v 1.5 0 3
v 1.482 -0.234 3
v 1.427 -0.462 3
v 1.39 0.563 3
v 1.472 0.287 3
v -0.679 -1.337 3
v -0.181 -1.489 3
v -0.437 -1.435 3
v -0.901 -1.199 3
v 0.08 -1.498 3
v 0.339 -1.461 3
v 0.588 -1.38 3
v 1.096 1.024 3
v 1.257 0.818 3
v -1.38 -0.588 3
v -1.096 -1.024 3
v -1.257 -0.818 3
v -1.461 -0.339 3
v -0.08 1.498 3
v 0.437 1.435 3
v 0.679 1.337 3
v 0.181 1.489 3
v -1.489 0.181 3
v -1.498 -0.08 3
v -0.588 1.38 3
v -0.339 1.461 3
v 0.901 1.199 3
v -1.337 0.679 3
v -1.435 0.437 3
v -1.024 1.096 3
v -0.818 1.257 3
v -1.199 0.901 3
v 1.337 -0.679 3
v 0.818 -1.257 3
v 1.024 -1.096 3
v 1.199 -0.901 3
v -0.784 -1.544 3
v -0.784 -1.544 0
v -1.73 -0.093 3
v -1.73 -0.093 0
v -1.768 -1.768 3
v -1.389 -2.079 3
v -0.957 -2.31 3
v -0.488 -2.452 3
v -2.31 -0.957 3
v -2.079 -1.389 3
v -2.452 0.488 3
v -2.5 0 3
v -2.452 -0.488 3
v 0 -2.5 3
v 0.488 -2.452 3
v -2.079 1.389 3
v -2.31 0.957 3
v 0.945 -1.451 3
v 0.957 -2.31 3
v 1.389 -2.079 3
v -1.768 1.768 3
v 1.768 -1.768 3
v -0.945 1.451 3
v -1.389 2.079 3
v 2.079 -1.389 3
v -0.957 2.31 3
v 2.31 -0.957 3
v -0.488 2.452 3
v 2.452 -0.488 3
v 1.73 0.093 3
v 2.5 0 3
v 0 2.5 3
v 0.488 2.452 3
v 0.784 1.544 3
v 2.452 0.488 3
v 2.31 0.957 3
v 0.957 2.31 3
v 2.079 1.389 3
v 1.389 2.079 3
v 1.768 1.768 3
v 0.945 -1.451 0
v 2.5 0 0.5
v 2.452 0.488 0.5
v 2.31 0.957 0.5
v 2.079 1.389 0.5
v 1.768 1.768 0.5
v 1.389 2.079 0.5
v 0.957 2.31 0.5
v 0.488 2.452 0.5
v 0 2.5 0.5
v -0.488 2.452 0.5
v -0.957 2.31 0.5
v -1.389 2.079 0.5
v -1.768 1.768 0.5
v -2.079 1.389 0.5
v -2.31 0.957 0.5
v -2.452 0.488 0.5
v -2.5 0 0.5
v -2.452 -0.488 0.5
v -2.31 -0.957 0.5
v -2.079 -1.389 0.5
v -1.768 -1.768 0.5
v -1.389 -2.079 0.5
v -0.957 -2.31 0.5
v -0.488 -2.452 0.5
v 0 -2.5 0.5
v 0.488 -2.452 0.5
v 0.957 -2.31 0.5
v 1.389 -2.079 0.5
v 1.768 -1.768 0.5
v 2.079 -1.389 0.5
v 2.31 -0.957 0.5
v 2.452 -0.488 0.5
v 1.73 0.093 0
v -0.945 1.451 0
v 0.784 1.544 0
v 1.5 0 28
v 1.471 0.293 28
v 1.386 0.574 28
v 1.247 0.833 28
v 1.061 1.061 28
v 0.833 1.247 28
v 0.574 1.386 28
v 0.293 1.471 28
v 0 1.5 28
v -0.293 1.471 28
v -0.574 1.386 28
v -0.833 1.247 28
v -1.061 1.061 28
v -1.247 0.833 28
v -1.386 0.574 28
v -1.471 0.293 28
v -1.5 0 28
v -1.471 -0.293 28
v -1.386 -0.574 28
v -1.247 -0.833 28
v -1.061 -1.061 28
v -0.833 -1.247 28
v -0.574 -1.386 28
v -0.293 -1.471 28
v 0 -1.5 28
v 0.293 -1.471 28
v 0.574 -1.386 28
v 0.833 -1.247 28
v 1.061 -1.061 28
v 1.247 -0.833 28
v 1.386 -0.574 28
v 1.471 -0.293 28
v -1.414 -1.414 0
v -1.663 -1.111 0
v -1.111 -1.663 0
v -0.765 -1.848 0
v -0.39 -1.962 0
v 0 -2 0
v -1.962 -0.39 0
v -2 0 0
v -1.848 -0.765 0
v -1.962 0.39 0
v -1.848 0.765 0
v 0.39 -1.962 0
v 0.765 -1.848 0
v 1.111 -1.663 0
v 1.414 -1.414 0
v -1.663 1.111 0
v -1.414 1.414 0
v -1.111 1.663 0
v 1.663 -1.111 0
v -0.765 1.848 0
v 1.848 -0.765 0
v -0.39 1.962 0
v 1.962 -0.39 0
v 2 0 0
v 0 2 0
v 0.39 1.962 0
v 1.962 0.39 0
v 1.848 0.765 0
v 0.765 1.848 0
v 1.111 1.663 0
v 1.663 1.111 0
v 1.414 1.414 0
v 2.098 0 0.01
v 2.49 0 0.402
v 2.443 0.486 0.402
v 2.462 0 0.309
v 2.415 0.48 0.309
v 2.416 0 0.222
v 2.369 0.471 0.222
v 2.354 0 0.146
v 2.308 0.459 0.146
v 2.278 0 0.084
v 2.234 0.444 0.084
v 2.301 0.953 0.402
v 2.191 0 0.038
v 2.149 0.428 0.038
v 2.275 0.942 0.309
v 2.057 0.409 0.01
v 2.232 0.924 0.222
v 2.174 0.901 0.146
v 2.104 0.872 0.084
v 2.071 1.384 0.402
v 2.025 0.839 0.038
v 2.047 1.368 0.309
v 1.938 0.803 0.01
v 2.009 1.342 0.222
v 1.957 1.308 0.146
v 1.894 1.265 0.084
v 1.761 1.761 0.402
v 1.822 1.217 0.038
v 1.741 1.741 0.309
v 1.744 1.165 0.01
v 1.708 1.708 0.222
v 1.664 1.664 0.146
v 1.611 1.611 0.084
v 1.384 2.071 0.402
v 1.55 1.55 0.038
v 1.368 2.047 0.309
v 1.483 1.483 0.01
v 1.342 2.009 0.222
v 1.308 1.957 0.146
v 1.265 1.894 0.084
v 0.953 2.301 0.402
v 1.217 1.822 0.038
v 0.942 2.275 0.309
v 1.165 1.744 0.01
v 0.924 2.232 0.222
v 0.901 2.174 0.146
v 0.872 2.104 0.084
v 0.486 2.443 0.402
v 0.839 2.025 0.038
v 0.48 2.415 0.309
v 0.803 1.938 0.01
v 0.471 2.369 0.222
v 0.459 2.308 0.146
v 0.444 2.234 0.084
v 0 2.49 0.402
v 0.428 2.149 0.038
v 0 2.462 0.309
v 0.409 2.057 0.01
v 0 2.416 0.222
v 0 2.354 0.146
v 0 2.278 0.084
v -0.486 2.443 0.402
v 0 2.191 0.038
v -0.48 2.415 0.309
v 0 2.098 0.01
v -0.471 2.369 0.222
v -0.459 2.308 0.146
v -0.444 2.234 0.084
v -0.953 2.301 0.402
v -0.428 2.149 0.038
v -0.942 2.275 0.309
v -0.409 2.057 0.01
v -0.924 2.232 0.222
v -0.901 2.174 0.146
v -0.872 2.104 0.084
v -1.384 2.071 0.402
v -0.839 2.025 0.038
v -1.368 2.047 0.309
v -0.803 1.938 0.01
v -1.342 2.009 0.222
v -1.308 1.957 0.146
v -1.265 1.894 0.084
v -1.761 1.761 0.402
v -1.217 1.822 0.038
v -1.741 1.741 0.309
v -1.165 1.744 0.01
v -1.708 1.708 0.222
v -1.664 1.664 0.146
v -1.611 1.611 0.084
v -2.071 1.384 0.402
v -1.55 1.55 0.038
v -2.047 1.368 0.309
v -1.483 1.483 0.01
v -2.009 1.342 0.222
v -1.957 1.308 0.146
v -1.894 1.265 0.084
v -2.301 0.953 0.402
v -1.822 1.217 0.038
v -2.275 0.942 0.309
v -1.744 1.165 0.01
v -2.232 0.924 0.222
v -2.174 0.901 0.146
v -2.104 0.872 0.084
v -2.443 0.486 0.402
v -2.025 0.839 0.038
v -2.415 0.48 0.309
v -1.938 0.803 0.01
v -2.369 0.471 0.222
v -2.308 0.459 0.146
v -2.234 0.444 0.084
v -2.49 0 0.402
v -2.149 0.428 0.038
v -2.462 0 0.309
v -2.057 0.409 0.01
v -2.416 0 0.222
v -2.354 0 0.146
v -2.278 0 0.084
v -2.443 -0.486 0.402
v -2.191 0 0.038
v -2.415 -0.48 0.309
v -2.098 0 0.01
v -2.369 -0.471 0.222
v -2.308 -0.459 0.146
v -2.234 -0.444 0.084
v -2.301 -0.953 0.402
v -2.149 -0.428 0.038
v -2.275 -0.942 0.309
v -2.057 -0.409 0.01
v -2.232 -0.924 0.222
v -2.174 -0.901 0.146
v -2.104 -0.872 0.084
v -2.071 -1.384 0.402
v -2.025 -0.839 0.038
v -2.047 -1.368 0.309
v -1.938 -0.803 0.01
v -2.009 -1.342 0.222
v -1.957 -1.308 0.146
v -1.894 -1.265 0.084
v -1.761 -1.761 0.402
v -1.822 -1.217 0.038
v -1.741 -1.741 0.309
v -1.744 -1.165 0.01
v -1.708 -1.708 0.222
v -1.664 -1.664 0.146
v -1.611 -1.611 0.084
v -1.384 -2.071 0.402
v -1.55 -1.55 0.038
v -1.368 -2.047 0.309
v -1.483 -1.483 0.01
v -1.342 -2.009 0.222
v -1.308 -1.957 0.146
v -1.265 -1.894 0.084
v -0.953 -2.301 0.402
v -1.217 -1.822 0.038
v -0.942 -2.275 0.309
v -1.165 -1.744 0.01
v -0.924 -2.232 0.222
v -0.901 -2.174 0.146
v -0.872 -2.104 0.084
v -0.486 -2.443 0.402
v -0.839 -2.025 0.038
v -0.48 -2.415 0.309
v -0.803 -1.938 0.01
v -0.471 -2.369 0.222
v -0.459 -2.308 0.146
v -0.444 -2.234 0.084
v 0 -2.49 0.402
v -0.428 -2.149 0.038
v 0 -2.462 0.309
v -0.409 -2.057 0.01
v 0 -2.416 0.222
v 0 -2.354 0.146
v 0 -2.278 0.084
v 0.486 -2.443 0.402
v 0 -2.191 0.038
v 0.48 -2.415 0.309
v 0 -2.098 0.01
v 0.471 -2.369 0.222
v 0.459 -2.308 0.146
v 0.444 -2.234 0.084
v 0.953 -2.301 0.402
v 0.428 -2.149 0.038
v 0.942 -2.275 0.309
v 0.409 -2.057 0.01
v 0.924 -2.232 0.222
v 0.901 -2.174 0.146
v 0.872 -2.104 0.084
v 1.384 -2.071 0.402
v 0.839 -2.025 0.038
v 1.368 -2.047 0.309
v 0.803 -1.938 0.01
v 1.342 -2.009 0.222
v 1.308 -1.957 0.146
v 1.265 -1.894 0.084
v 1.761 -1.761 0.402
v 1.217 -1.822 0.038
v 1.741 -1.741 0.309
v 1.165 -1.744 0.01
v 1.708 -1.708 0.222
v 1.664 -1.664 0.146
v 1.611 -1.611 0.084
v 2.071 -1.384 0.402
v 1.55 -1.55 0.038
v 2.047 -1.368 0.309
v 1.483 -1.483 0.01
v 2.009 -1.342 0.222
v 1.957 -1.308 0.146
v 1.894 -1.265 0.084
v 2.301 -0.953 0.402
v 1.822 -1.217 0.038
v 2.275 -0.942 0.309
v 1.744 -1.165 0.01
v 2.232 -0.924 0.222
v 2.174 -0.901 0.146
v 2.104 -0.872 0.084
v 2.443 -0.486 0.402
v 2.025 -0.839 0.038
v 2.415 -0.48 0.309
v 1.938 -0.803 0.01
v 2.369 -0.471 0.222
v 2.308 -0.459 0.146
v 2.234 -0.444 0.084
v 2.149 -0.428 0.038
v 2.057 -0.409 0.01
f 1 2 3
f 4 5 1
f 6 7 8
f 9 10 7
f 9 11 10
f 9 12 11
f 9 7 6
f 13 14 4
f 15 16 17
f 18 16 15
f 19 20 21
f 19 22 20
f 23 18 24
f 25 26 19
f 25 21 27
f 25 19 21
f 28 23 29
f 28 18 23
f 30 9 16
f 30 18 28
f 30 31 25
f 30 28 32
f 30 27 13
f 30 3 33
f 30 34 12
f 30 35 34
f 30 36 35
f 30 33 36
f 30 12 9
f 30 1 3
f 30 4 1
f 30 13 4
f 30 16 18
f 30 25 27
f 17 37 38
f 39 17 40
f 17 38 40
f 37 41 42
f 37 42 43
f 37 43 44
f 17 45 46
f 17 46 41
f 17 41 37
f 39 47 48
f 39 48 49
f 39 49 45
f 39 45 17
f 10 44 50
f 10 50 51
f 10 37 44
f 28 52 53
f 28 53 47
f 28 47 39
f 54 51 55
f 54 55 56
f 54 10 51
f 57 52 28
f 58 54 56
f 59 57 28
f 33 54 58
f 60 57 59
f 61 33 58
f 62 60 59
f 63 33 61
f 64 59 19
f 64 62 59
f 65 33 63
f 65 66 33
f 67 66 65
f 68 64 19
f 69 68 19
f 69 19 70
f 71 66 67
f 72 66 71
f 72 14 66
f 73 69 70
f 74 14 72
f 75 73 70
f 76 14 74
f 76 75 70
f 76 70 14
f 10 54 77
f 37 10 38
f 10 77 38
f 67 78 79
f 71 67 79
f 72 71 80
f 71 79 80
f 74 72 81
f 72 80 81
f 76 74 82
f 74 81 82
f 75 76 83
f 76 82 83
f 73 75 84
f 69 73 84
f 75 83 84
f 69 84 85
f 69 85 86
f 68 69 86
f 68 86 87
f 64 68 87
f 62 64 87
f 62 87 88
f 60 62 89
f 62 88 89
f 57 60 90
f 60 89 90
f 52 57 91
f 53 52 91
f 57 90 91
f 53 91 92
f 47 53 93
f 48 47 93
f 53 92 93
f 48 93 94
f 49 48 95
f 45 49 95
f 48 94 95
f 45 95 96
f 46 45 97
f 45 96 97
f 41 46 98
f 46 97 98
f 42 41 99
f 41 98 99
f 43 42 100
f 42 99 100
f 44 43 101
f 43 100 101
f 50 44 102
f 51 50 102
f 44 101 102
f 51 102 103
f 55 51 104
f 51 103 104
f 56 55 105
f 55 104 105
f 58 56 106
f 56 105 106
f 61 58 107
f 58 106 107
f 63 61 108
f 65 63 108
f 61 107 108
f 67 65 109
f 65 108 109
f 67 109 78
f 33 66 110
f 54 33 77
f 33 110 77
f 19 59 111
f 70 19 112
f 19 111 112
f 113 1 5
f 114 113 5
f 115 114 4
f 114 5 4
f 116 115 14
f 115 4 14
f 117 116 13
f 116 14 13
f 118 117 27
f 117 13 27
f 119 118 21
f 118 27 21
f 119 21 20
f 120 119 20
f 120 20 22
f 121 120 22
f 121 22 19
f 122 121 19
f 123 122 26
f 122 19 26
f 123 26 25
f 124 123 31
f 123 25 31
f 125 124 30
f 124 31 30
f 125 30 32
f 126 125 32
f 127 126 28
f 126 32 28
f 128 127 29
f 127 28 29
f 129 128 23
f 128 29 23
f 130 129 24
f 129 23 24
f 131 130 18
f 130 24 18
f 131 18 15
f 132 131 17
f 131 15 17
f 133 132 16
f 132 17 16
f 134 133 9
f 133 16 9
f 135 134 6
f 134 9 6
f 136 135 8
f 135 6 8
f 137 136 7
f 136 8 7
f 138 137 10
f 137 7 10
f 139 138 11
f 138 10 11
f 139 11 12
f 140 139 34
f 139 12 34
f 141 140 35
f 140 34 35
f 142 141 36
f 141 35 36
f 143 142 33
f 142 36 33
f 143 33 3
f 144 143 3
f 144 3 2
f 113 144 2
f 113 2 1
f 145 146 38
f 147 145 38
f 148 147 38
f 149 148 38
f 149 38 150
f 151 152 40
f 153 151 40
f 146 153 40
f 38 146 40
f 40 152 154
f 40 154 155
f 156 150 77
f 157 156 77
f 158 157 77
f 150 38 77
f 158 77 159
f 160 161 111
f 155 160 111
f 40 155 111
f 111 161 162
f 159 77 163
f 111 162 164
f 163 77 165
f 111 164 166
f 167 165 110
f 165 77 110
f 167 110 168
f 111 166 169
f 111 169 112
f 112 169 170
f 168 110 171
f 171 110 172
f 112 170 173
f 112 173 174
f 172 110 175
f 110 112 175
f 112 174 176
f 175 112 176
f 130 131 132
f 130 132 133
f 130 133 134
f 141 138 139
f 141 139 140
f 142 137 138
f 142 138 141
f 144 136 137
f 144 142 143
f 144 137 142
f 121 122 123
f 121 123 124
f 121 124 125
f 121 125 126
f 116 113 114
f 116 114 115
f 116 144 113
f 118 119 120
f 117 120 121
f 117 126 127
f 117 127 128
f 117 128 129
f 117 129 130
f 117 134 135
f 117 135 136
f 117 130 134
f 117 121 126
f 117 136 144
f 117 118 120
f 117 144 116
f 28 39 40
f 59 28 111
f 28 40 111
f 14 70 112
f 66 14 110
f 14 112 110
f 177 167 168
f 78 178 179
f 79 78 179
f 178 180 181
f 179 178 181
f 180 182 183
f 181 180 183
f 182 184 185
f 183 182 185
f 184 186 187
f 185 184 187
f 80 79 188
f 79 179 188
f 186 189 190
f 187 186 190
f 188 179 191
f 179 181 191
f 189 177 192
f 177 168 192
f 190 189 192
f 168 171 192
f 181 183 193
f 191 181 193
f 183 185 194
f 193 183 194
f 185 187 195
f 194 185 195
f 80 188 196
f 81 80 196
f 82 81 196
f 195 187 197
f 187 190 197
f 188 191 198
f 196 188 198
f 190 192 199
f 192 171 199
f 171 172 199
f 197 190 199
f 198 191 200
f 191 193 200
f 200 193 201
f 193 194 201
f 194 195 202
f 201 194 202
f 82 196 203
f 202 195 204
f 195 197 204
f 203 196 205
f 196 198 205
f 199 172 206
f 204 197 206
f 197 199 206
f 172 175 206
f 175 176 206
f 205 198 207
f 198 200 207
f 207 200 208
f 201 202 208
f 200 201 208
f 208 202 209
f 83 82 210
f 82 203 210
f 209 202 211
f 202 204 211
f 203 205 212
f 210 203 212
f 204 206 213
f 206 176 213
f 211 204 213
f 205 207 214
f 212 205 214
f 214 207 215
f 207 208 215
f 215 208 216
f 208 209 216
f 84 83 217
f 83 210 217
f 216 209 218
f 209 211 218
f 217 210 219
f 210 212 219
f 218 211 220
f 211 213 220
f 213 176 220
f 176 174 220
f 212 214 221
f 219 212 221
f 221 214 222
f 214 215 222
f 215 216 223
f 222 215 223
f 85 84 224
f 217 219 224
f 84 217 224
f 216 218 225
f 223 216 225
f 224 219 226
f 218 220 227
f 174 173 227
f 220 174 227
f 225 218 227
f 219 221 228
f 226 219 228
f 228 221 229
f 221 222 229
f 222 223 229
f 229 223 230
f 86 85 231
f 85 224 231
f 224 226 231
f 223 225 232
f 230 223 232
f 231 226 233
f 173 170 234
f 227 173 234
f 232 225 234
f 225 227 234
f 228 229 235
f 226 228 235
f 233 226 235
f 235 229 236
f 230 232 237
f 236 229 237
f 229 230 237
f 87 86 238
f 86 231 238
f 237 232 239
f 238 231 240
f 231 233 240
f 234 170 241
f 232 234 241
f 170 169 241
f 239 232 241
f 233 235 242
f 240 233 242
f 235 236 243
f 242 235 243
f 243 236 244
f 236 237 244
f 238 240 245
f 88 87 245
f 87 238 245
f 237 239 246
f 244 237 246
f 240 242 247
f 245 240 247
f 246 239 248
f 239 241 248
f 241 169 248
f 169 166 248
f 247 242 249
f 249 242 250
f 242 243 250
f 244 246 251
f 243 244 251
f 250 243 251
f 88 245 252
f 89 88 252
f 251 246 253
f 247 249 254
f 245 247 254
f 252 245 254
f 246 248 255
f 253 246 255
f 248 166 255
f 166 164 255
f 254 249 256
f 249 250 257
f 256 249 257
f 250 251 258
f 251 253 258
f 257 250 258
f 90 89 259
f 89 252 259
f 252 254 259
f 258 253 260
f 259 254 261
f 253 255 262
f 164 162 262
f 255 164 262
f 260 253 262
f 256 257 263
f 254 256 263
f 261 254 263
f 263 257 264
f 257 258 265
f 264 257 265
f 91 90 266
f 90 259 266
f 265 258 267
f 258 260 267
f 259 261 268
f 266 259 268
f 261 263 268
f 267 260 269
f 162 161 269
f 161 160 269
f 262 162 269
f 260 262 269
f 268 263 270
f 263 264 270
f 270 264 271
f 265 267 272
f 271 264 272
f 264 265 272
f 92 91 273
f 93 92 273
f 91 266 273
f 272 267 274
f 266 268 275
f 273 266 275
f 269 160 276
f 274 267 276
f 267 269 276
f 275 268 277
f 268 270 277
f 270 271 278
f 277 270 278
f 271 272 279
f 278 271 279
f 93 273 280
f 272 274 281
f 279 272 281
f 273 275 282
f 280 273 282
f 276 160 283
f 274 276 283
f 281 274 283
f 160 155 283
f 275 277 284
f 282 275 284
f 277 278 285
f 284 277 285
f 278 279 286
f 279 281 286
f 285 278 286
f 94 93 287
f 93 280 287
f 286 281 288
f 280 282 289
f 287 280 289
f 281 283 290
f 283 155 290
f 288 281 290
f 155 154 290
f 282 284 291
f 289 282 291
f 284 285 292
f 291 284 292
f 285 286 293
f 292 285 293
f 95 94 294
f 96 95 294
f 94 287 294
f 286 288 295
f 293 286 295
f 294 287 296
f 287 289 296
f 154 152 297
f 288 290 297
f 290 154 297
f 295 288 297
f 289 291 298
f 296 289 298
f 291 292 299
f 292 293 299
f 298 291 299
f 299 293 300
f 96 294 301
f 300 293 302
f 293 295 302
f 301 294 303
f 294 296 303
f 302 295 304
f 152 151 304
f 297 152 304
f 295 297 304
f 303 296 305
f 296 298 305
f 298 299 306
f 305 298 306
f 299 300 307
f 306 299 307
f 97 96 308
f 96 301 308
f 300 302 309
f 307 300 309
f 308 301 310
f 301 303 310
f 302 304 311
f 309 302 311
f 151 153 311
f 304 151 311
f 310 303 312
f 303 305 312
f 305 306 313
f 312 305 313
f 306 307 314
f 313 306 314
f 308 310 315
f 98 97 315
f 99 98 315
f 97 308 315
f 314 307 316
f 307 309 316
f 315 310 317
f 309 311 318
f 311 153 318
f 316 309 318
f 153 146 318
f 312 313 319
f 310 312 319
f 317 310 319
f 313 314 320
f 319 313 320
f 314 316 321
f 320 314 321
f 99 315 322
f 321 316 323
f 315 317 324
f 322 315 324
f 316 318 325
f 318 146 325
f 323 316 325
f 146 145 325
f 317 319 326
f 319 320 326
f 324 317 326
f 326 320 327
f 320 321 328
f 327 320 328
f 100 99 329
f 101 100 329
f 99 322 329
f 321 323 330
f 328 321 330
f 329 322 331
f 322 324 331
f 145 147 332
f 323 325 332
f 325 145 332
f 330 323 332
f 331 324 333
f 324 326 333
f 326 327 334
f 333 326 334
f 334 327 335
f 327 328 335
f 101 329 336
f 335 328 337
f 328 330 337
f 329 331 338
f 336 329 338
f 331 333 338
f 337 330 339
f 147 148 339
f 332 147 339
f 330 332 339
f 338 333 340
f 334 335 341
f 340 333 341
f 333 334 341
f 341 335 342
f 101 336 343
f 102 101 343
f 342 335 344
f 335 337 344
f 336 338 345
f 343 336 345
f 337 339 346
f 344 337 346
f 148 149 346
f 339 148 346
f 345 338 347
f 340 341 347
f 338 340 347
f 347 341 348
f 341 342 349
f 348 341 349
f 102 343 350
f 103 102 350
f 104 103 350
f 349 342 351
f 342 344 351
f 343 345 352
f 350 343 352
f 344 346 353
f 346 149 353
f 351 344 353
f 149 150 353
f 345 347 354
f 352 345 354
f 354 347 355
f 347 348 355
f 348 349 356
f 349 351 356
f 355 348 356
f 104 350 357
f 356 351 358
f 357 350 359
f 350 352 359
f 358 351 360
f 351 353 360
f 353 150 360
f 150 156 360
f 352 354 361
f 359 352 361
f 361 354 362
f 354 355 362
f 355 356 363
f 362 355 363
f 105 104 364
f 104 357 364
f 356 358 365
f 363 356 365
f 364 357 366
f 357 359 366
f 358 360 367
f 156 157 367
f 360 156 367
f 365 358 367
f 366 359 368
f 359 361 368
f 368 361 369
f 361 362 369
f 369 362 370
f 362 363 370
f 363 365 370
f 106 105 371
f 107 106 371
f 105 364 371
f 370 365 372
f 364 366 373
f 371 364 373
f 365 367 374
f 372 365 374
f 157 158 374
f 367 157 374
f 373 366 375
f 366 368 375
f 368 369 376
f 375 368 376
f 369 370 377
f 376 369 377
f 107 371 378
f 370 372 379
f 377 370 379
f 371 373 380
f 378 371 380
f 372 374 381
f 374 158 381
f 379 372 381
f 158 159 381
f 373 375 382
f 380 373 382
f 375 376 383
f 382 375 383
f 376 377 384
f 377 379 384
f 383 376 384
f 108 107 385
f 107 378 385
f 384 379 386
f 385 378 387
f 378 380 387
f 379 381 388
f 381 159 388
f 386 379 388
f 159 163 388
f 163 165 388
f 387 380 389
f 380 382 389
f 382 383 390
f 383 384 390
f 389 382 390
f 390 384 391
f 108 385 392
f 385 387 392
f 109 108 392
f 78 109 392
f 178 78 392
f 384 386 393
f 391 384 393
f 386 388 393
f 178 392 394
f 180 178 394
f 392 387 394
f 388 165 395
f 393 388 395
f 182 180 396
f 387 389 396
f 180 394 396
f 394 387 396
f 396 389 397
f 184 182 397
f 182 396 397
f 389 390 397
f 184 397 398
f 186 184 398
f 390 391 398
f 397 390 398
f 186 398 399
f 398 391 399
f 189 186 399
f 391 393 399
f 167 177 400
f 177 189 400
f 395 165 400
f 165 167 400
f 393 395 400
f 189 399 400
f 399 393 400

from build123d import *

# Parameters (mm, degrees)
SKETCH1_R           = 2.5
BOSS_EXTRUDE1_DEPTH = 3
SKETCH2_R           = 1.5
BOSS_EXTRUDE2_DEPTH = 25
CUT_EXTRUDE1_DEPTH  = 3
FILLET1_R           = 0.5


with BuildPart() as part:
    # Sketch1 → Boss-Extrude1 (new body)
    with BuildSketch(Plane.XY):
        Circle(SKETCH1_R)
    extrude(amount=BOSS_EXTRUDE1_DEPTH)

    # Sketch2 → Boss-Extrude2 (add)
    with BuildSketch(Plane.XY.offset(3)):
        Circle(SKETCH2_R)
    extrude(amount=BOSS_EXTRUDE2_DEPTH)

    # Sketch3 → Cut-Extrude1 (cut)
    with BuildSketch(Plane(origin=(0, 0, 0), x_dir=(-1, 0, 0), z_dir=(0, 0, -1))):
        Polygon((0.784462107, -1.544221229), (1.729565866, -0.092746502), (0.94510376, 1.451474727), (-0.784462107, 1.544221229), (-1.729565866, 0.092746502), (-0.94510376, -1.451474727), align=None)
    extrude(amount=-CUT_EXTRUDE1_DEPTH, mode=Mode.SUBTRACT)

    # Fillet1
    fillet1_edges = [part.edges().sort_by_distance(p)[0] for p in [
        (-2.5, 0, 0),
    ]]
    fillet(fillet1_edges, radius=FILLET1_R)


solid = part.part
